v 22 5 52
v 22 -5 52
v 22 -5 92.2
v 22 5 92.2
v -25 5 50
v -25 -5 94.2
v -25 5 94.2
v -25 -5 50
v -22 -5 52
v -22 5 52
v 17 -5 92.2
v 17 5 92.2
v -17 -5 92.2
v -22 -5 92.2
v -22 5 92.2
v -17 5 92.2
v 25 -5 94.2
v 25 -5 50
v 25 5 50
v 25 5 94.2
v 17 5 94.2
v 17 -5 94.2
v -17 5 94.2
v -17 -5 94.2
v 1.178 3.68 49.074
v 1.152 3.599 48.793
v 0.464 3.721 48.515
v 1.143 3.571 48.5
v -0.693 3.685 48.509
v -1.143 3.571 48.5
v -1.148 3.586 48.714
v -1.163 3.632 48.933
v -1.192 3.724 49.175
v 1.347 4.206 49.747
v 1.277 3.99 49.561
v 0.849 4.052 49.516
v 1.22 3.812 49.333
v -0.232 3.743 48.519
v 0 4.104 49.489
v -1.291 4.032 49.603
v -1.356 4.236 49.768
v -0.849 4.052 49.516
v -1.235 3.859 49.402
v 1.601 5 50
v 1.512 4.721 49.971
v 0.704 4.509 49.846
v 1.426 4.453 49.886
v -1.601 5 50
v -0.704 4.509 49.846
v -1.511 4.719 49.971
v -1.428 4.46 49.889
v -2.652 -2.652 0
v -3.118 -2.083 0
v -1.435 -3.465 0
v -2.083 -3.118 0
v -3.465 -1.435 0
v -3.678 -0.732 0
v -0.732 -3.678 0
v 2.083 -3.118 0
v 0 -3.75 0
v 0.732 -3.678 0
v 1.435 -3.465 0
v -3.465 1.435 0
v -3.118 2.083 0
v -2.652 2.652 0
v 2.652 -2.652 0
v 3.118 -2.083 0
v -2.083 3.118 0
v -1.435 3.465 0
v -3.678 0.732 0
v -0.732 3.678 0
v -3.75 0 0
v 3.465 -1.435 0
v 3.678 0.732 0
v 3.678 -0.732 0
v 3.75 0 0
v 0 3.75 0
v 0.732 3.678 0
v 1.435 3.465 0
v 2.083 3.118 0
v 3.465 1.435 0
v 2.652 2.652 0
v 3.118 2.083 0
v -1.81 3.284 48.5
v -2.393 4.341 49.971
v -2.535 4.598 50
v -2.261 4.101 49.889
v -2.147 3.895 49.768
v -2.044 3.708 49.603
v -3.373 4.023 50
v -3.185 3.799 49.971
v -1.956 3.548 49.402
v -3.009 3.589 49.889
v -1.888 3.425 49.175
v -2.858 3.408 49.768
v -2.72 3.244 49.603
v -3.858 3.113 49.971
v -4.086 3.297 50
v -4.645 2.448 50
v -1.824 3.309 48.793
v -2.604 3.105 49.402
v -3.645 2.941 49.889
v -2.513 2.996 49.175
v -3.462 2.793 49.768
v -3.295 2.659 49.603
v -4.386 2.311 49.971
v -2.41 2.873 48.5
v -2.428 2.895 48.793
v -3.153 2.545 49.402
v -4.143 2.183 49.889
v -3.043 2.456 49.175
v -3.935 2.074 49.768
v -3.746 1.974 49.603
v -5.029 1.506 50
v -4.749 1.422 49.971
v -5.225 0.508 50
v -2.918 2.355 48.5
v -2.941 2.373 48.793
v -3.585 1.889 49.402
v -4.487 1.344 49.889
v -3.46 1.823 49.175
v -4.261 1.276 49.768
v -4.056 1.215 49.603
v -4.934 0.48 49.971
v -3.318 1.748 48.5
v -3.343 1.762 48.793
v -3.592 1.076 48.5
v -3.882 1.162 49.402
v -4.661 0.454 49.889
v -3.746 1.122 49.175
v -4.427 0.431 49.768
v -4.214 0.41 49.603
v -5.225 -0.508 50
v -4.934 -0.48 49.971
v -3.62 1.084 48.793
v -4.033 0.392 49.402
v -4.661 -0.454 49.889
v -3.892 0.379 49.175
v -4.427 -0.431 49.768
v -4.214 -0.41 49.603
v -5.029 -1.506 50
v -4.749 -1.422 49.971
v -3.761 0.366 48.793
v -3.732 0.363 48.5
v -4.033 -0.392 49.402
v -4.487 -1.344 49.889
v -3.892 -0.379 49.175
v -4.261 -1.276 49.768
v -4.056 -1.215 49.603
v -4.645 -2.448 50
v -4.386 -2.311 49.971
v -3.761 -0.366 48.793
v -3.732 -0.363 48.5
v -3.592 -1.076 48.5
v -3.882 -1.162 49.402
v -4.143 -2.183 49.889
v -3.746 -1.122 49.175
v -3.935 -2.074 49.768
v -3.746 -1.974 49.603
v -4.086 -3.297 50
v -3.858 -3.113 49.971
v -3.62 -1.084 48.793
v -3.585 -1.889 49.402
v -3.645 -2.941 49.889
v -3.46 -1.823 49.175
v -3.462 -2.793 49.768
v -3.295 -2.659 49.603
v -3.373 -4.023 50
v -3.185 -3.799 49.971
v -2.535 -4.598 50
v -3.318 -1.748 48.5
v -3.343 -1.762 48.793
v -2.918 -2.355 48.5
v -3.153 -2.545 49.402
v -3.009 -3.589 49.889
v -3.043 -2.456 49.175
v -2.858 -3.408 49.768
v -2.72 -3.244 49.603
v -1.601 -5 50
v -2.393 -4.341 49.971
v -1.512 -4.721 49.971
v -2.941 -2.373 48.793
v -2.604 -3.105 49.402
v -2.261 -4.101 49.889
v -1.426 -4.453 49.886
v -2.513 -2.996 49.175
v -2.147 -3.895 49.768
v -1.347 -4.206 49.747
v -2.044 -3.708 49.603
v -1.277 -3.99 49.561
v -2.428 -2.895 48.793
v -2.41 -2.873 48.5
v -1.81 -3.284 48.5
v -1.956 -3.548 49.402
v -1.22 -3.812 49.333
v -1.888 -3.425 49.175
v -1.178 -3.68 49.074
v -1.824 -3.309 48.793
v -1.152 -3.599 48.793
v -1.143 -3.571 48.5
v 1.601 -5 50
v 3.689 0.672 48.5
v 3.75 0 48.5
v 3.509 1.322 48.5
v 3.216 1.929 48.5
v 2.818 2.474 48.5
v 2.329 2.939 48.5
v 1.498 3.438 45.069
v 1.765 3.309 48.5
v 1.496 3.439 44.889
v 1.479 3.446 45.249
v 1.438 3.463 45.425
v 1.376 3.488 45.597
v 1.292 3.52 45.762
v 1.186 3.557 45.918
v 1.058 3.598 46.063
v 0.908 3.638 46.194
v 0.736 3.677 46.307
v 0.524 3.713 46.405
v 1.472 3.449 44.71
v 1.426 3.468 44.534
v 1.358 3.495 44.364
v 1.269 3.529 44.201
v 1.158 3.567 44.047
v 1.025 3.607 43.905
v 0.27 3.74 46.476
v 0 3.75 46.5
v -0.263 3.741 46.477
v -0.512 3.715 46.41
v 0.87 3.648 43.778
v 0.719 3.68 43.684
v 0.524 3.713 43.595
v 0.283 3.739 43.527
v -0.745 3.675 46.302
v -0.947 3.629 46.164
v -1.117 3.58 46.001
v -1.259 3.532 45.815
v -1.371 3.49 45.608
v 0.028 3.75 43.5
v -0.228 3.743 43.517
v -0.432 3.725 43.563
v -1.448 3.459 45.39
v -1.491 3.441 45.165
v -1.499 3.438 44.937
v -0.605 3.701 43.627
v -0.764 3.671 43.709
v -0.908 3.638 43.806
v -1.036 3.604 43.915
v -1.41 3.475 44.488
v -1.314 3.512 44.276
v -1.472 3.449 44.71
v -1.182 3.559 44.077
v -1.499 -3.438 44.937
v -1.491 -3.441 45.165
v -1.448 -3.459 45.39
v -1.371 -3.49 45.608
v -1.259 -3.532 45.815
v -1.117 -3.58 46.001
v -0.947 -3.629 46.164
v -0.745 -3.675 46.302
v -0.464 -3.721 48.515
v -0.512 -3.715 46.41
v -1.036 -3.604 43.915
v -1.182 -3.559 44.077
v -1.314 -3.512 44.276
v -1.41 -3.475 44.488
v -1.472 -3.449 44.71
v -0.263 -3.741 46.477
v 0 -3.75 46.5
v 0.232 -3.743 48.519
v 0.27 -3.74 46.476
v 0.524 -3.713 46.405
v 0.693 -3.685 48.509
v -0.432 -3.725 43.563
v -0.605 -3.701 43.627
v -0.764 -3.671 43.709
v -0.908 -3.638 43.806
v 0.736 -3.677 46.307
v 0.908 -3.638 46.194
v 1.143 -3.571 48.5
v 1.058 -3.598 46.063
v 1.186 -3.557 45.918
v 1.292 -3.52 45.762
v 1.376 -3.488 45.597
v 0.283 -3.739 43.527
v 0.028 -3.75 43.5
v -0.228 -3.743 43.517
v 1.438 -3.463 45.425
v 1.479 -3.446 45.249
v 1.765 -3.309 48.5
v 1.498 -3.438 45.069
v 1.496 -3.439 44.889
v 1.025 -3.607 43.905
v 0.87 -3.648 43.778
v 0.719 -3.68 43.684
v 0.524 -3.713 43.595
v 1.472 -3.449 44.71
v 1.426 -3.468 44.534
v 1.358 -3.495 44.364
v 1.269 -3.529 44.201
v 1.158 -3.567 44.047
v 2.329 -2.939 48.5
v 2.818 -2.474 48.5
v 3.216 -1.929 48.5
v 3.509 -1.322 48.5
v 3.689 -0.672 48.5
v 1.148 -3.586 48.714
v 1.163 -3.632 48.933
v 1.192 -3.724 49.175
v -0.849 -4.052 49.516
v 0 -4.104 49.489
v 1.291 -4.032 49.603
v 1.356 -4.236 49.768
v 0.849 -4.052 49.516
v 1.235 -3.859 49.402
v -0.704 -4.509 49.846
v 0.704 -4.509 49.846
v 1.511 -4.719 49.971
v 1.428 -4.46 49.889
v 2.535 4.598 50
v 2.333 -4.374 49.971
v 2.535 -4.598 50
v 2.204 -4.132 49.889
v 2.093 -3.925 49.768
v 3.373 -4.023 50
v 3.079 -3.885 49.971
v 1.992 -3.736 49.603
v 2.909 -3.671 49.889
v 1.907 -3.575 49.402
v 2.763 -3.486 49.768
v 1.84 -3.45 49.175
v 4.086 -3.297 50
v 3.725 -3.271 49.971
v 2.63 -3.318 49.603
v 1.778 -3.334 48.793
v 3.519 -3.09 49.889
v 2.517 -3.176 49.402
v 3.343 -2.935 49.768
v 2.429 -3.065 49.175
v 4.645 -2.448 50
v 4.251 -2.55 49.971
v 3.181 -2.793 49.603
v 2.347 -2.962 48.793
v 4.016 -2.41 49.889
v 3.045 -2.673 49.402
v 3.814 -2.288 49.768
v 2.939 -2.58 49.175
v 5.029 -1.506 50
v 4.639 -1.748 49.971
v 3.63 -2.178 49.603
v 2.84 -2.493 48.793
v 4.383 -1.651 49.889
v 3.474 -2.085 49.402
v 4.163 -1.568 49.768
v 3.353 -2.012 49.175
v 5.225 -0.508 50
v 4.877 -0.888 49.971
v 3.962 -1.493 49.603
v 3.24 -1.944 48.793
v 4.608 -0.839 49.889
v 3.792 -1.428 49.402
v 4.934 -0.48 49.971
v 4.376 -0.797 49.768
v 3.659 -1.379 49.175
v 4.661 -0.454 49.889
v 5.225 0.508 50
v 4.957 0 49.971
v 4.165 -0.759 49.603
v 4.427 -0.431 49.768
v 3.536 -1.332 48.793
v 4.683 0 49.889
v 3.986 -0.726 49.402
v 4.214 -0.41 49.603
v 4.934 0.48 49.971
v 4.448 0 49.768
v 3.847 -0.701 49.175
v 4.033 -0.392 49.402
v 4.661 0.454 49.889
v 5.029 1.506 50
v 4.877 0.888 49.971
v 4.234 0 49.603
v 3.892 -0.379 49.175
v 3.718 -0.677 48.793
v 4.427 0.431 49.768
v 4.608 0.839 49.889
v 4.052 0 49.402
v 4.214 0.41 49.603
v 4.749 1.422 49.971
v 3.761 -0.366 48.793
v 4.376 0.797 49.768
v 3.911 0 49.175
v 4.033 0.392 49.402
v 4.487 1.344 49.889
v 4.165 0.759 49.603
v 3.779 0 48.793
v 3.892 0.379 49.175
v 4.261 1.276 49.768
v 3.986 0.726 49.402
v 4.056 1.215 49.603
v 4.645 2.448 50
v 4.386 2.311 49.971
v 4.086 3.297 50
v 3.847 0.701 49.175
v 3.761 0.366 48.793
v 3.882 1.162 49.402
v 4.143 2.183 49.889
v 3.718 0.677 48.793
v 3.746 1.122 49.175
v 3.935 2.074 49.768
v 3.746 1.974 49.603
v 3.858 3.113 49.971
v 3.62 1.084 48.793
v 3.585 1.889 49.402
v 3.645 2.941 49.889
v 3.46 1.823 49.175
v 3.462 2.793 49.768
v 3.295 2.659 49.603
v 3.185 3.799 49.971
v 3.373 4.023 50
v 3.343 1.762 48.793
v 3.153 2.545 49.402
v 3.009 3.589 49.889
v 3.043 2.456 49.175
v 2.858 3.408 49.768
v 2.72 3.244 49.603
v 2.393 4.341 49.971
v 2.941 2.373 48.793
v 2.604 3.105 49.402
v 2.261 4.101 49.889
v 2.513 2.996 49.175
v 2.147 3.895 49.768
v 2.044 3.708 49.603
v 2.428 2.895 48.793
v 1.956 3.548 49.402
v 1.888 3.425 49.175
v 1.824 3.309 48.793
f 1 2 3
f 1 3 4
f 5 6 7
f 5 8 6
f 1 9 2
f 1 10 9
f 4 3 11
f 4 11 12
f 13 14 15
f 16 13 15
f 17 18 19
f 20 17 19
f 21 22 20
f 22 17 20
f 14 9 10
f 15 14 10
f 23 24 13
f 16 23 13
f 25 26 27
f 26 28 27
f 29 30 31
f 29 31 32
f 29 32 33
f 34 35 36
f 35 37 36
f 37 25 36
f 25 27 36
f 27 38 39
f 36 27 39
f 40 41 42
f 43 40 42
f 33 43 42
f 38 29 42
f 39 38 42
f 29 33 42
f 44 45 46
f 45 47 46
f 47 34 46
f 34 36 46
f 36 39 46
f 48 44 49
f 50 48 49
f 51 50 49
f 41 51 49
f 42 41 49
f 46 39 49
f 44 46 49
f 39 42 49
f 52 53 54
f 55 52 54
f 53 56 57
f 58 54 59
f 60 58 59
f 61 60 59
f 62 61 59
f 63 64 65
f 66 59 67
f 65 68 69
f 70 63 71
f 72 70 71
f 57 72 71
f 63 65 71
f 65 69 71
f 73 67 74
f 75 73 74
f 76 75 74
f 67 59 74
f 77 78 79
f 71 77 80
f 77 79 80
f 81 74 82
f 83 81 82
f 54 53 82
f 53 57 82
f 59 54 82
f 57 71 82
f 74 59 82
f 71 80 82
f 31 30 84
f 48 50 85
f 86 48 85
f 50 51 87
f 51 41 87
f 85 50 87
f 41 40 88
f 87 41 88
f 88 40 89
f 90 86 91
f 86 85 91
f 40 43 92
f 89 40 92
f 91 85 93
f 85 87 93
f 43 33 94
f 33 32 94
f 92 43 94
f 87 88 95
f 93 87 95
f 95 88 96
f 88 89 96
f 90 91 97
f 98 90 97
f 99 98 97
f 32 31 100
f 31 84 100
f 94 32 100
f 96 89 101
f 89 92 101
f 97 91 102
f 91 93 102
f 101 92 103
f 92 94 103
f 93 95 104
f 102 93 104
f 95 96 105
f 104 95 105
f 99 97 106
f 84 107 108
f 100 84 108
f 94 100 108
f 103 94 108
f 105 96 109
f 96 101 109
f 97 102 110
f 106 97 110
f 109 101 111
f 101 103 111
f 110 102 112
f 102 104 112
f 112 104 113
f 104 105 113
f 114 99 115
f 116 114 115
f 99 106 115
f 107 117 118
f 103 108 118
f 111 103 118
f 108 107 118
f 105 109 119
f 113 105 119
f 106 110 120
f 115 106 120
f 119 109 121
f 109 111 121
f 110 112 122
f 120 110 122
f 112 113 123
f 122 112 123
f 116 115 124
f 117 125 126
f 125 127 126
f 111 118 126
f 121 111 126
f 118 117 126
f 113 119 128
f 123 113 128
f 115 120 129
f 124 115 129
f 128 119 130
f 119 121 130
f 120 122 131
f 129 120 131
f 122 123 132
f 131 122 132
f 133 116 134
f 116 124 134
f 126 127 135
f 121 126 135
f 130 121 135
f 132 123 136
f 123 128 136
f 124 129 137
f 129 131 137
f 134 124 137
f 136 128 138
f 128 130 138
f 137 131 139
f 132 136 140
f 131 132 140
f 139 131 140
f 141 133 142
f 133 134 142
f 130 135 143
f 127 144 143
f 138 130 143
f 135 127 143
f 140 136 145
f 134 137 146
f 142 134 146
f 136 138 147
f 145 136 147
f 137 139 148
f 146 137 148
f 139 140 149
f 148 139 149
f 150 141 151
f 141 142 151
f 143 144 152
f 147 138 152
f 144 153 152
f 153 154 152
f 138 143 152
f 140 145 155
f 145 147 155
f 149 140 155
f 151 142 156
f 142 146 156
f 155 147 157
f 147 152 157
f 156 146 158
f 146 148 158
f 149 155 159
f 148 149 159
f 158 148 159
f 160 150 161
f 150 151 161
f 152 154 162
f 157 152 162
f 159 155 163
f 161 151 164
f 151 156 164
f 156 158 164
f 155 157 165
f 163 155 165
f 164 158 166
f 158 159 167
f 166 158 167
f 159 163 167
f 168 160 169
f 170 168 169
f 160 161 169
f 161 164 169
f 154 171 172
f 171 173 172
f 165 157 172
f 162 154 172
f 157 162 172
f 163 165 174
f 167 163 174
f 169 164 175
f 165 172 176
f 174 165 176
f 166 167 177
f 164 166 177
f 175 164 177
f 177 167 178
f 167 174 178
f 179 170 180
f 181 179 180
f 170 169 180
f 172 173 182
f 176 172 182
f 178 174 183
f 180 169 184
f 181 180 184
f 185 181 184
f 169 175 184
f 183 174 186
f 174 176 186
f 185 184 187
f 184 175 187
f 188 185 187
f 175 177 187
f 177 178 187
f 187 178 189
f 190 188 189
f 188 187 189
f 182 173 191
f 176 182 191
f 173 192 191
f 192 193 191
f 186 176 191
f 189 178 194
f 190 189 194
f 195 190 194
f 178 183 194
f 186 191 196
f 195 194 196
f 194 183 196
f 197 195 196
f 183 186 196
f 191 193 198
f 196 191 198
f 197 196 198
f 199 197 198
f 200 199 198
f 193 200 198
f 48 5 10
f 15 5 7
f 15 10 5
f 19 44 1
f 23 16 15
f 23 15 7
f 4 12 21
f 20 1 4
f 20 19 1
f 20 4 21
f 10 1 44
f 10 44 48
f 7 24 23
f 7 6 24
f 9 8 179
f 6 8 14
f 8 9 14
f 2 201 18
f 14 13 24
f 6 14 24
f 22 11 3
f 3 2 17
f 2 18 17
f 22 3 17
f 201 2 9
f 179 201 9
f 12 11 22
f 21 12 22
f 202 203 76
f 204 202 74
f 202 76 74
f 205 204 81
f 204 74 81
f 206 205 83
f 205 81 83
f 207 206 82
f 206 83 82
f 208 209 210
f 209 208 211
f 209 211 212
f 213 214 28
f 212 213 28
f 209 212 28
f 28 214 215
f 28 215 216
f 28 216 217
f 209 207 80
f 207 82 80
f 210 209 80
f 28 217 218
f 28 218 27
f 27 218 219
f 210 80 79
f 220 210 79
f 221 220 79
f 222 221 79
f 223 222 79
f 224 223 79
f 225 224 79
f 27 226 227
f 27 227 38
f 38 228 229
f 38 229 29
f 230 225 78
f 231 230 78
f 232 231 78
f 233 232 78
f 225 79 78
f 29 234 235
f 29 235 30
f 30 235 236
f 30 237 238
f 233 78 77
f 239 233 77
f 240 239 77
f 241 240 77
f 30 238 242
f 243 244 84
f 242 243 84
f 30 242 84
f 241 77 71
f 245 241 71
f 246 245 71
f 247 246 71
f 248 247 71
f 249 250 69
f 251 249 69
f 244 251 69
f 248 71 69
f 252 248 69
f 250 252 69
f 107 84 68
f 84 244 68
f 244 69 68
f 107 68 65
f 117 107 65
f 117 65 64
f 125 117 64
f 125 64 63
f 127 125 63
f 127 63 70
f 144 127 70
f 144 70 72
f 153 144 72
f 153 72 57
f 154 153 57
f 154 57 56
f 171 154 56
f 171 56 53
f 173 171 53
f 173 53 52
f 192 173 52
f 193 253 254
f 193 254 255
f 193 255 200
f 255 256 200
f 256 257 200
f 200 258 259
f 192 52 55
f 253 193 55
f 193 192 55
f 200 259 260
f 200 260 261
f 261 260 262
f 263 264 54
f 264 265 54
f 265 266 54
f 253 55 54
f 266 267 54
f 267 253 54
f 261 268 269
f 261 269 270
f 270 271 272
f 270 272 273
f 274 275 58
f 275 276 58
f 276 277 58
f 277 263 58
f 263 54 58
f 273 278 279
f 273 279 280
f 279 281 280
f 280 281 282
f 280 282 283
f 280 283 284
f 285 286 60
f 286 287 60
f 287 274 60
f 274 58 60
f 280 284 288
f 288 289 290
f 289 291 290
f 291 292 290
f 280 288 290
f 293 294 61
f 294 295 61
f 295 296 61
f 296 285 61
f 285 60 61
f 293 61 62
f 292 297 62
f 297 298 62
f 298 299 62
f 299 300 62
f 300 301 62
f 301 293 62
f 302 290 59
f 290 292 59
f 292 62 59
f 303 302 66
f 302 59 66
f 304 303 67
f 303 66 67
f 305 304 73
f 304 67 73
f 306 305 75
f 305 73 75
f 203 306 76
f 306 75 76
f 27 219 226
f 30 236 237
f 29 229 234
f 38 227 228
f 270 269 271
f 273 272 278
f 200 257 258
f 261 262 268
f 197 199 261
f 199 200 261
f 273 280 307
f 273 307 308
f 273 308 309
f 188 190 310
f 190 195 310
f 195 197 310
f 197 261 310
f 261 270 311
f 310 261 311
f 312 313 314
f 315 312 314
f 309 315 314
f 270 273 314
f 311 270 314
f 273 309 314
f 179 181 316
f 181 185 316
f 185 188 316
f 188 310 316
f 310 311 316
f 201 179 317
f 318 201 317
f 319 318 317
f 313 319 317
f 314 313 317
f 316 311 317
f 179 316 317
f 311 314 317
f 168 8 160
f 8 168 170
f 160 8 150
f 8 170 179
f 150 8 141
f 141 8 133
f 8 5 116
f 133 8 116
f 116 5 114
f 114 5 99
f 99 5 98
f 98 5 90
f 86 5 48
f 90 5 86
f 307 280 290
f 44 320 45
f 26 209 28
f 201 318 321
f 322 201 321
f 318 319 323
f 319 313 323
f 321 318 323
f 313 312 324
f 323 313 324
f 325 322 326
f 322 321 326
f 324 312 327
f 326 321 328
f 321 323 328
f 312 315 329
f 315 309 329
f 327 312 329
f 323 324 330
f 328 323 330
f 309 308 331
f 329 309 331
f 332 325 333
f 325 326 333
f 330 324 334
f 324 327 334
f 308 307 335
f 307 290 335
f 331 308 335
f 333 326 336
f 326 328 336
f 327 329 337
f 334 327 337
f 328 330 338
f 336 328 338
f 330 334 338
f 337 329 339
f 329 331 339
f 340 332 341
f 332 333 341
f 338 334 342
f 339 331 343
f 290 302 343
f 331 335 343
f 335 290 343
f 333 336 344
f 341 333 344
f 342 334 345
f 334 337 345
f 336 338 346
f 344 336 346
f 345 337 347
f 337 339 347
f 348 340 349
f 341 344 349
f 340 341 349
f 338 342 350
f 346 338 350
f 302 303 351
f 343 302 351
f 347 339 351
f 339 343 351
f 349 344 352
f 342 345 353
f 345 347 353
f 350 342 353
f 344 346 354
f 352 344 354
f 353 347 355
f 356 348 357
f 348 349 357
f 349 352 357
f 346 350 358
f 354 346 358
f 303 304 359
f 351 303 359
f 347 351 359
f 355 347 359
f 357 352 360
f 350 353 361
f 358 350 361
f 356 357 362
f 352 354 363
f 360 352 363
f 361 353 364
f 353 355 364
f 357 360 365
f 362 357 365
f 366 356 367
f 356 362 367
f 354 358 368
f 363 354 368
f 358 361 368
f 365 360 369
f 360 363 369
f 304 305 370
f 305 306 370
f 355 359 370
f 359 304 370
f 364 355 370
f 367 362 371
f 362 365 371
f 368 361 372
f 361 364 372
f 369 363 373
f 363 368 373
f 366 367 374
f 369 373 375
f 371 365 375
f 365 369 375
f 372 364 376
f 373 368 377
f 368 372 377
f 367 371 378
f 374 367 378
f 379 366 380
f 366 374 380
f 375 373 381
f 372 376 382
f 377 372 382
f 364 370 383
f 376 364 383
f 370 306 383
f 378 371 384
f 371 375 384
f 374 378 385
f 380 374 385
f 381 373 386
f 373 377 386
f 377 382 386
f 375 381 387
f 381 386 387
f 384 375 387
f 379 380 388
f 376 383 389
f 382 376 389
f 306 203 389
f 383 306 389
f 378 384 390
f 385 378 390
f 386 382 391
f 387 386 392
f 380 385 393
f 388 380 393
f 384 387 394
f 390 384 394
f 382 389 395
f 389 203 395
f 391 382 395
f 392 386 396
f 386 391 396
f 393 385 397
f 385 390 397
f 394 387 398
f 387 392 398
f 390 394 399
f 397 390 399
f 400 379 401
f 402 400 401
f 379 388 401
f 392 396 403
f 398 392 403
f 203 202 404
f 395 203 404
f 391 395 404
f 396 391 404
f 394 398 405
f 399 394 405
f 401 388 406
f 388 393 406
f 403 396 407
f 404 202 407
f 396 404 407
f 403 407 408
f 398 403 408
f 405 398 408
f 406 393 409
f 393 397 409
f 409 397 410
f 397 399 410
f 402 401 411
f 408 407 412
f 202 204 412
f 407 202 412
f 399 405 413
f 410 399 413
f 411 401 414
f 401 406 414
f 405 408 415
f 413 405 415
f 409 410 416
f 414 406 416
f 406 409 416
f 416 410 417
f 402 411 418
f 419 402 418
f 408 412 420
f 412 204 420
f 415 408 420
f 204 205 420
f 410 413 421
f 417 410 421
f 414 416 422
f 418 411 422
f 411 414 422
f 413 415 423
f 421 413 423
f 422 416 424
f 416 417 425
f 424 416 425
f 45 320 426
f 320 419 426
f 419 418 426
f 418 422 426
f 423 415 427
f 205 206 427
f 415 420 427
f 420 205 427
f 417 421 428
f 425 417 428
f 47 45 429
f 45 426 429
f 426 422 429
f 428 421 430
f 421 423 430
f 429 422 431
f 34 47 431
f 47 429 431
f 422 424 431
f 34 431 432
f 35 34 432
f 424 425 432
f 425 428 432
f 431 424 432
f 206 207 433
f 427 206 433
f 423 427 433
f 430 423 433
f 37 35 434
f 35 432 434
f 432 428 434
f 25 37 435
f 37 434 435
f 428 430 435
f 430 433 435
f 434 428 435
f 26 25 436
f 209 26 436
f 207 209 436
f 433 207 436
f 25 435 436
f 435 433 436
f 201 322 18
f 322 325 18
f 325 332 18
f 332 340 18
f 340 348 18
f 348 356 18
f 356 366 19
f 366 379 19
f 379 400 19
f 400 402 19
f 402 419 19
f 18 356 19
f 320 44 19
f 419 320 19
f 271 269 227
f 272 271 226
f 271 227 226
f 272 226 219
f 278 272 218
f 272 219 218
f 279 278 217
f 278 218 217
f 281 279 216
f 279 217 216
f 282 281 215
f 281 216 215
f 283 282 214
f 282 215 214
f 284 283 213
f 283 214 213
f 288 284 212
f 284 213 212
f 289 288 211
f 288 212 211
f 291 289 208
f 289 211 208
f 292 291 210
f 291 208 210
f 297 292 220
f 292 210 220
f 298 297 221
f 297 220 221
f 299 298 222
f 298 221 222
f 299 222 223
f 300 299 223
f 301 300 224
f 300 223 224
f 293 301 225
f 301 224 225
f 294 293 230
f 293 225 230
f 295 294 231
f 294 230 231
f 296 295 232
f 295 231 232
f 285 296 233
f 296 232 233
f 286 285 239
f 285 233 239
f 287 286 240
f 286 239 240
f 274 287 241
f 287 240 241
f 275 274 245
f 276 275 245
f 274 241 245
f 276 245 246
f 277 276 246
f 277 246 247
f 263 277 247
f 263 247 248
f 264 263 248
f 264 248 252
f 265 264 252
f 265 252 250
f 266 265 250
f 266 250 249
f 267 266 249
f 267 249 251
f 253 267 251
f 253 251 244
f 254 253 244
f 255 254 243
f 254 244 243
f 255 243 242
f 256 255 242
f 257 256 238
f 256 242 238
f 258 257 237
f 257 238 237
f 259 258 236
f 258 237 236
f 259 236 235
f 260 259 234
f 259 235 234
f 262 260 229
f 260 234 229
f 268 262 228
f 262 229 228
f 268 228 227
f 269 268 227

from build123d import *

# Parameters (mm, degrees)
ESBO_O1_R                = 3.75
RESSALTO_EXTRUS_O1_DEPTH = 50
RESSALTO_EXTRUS_O2_DEPTH = 2
ESBO_O3_W                = 3
ESBO_O3_H                = 10
RESSALTO_EXTRUS_O3_DEPTH = 42.2
ESBO_O4_W                = 2
ESBO_O4_H                = 10
RESSALTO_EXTRUS_O4_DEPTH = 5
ESBO_O5_W                = 2
ESBO_O5_H                = 10
RESSALTO_EXTRUS_O5_DEPTH = 5
FILETE1_R                = 1.5
ESBO_O6_R                = 1.5
CORTE_EXTRUS_O1_DEPTH    = 5


with BuildPart() as part:
    # Esboço1 → Ressalto-extrusão1 (new body)
    with BuildSketch(Plane.XY):
        Circle(ESBO_O1_R)
    extrude(amount=RESSALTO_EXTRUS_O1_DEPTH)

    # Esboço2 → Ressalto-extrusão2 (add)
    with BuildSketch(Plane.XY.offset(50)):
        with BuildLine():
            Line((0, 5), (0, 3.75))
            ThreePointArc((0, 3.75), (2.651650429, 2.651650429), (3.75, 0))
            ThreePointArc((3.75, 0), (2.651650429, -2.651650429), (0, -3.75))
            Line((0, -3.75), (0, -5))
            Line((0, -5), (25, -5))
            Line((25, -5), (25, 5))
            Line((25, 5), (0, 5))
        make_face()
        with BuildLine():
            ThreePointArc((0, -3.75), (-3.75, 0), (0, 3.75))
            Line((0, 3.75), (0, 5))
            Line((0, 5), (-25, 5))
            Line((-25, 5), (-25, -5))
            Line((-25, -5), (0, -5))
            Line((0, -5), (0, -3.75))
        make_face()
        with BuildLine():
            Line((0, -3.75), (0, 0))
            Line((0, 0), (0, 3.75))
            ThreePointArc((0, 3.75), (-3.75, 0), (0, -3.75))
        make_face()
        with BuildLine():
            Line((0, 3.75), (0, 0))
            Line((0, 0), (0, -3.75))
            ThreePointArc((0, -3.75), (2.651650429, -2.651650429), (3.75, 0))
            ThreePointArc((3.75, 0), (2.651650429, 2.651650429), (0, 3.75))
        make_face()
    extrude(amount=RESSALTO_EXTRUS_O2_DEPTH)

    # Esboço3 → Ressalto-extrusão3 (add)
    with BuildSketch(Plane.XY.offset(52)):
        with Locations((-23.5, 0)):
            Rectangle(ESBO_O3_W, ESBO_O3_H)
        with Locations((23.5, 0)):
            Rectangle(ESBO_O3_W, ESBO_O3_H)
    extrude(amount=RESSALTO_EXTRUS_O3_DEPTH)

    # Esboço4 → Ressalto-extrusão4 (add)
    with BuildSketch(Plane(origin=(-22, 0, 0), x_dir=(0, 0, -1), z_dir=(1, 0, 0))):
        with Locations((-93.2, 0)):
            Rectangle(ESBO_O4_W, ESBO_O4_H)
    extrude(amount=RESSALTO_EXTRUS_O4_DEPTH)

    # Esboço5 → Ressalto-extrusão5 (add)
    with BuildSketch(Plane.ZY.offset(-22)):
        with Locations((93.2, 0)):
            Rectangle(ESBO_O5_W, ESBO_O5_H)
    extrude(amount=RESSALTO_EXTRUS_O5_DEPTH)

    # Filete1
    filete1_edges = [part.edges().sort_by_distance(p)[0] for p in [
        (-3.75, 0, 50),
    ]]
    fillet(filete1_edges, radius=FILETE1_R)

    # Esboço6 → Corte-extrusão1 (cut, symmetric)
    with BuildSketch(Plane(origin=(0, 0, 0), x_dir=(1, 0, 0), z_dir=(0, 1, 0))):
        with Locations(Location((0, -45, 0), (0, 0, 270))):
            Circle(ESBO_O6_R)
    extrude(amount=CORTE_EXTRUS_O1_DEPTH, both=True, mode=Mode.SUBTRACT)


solid = part.part
